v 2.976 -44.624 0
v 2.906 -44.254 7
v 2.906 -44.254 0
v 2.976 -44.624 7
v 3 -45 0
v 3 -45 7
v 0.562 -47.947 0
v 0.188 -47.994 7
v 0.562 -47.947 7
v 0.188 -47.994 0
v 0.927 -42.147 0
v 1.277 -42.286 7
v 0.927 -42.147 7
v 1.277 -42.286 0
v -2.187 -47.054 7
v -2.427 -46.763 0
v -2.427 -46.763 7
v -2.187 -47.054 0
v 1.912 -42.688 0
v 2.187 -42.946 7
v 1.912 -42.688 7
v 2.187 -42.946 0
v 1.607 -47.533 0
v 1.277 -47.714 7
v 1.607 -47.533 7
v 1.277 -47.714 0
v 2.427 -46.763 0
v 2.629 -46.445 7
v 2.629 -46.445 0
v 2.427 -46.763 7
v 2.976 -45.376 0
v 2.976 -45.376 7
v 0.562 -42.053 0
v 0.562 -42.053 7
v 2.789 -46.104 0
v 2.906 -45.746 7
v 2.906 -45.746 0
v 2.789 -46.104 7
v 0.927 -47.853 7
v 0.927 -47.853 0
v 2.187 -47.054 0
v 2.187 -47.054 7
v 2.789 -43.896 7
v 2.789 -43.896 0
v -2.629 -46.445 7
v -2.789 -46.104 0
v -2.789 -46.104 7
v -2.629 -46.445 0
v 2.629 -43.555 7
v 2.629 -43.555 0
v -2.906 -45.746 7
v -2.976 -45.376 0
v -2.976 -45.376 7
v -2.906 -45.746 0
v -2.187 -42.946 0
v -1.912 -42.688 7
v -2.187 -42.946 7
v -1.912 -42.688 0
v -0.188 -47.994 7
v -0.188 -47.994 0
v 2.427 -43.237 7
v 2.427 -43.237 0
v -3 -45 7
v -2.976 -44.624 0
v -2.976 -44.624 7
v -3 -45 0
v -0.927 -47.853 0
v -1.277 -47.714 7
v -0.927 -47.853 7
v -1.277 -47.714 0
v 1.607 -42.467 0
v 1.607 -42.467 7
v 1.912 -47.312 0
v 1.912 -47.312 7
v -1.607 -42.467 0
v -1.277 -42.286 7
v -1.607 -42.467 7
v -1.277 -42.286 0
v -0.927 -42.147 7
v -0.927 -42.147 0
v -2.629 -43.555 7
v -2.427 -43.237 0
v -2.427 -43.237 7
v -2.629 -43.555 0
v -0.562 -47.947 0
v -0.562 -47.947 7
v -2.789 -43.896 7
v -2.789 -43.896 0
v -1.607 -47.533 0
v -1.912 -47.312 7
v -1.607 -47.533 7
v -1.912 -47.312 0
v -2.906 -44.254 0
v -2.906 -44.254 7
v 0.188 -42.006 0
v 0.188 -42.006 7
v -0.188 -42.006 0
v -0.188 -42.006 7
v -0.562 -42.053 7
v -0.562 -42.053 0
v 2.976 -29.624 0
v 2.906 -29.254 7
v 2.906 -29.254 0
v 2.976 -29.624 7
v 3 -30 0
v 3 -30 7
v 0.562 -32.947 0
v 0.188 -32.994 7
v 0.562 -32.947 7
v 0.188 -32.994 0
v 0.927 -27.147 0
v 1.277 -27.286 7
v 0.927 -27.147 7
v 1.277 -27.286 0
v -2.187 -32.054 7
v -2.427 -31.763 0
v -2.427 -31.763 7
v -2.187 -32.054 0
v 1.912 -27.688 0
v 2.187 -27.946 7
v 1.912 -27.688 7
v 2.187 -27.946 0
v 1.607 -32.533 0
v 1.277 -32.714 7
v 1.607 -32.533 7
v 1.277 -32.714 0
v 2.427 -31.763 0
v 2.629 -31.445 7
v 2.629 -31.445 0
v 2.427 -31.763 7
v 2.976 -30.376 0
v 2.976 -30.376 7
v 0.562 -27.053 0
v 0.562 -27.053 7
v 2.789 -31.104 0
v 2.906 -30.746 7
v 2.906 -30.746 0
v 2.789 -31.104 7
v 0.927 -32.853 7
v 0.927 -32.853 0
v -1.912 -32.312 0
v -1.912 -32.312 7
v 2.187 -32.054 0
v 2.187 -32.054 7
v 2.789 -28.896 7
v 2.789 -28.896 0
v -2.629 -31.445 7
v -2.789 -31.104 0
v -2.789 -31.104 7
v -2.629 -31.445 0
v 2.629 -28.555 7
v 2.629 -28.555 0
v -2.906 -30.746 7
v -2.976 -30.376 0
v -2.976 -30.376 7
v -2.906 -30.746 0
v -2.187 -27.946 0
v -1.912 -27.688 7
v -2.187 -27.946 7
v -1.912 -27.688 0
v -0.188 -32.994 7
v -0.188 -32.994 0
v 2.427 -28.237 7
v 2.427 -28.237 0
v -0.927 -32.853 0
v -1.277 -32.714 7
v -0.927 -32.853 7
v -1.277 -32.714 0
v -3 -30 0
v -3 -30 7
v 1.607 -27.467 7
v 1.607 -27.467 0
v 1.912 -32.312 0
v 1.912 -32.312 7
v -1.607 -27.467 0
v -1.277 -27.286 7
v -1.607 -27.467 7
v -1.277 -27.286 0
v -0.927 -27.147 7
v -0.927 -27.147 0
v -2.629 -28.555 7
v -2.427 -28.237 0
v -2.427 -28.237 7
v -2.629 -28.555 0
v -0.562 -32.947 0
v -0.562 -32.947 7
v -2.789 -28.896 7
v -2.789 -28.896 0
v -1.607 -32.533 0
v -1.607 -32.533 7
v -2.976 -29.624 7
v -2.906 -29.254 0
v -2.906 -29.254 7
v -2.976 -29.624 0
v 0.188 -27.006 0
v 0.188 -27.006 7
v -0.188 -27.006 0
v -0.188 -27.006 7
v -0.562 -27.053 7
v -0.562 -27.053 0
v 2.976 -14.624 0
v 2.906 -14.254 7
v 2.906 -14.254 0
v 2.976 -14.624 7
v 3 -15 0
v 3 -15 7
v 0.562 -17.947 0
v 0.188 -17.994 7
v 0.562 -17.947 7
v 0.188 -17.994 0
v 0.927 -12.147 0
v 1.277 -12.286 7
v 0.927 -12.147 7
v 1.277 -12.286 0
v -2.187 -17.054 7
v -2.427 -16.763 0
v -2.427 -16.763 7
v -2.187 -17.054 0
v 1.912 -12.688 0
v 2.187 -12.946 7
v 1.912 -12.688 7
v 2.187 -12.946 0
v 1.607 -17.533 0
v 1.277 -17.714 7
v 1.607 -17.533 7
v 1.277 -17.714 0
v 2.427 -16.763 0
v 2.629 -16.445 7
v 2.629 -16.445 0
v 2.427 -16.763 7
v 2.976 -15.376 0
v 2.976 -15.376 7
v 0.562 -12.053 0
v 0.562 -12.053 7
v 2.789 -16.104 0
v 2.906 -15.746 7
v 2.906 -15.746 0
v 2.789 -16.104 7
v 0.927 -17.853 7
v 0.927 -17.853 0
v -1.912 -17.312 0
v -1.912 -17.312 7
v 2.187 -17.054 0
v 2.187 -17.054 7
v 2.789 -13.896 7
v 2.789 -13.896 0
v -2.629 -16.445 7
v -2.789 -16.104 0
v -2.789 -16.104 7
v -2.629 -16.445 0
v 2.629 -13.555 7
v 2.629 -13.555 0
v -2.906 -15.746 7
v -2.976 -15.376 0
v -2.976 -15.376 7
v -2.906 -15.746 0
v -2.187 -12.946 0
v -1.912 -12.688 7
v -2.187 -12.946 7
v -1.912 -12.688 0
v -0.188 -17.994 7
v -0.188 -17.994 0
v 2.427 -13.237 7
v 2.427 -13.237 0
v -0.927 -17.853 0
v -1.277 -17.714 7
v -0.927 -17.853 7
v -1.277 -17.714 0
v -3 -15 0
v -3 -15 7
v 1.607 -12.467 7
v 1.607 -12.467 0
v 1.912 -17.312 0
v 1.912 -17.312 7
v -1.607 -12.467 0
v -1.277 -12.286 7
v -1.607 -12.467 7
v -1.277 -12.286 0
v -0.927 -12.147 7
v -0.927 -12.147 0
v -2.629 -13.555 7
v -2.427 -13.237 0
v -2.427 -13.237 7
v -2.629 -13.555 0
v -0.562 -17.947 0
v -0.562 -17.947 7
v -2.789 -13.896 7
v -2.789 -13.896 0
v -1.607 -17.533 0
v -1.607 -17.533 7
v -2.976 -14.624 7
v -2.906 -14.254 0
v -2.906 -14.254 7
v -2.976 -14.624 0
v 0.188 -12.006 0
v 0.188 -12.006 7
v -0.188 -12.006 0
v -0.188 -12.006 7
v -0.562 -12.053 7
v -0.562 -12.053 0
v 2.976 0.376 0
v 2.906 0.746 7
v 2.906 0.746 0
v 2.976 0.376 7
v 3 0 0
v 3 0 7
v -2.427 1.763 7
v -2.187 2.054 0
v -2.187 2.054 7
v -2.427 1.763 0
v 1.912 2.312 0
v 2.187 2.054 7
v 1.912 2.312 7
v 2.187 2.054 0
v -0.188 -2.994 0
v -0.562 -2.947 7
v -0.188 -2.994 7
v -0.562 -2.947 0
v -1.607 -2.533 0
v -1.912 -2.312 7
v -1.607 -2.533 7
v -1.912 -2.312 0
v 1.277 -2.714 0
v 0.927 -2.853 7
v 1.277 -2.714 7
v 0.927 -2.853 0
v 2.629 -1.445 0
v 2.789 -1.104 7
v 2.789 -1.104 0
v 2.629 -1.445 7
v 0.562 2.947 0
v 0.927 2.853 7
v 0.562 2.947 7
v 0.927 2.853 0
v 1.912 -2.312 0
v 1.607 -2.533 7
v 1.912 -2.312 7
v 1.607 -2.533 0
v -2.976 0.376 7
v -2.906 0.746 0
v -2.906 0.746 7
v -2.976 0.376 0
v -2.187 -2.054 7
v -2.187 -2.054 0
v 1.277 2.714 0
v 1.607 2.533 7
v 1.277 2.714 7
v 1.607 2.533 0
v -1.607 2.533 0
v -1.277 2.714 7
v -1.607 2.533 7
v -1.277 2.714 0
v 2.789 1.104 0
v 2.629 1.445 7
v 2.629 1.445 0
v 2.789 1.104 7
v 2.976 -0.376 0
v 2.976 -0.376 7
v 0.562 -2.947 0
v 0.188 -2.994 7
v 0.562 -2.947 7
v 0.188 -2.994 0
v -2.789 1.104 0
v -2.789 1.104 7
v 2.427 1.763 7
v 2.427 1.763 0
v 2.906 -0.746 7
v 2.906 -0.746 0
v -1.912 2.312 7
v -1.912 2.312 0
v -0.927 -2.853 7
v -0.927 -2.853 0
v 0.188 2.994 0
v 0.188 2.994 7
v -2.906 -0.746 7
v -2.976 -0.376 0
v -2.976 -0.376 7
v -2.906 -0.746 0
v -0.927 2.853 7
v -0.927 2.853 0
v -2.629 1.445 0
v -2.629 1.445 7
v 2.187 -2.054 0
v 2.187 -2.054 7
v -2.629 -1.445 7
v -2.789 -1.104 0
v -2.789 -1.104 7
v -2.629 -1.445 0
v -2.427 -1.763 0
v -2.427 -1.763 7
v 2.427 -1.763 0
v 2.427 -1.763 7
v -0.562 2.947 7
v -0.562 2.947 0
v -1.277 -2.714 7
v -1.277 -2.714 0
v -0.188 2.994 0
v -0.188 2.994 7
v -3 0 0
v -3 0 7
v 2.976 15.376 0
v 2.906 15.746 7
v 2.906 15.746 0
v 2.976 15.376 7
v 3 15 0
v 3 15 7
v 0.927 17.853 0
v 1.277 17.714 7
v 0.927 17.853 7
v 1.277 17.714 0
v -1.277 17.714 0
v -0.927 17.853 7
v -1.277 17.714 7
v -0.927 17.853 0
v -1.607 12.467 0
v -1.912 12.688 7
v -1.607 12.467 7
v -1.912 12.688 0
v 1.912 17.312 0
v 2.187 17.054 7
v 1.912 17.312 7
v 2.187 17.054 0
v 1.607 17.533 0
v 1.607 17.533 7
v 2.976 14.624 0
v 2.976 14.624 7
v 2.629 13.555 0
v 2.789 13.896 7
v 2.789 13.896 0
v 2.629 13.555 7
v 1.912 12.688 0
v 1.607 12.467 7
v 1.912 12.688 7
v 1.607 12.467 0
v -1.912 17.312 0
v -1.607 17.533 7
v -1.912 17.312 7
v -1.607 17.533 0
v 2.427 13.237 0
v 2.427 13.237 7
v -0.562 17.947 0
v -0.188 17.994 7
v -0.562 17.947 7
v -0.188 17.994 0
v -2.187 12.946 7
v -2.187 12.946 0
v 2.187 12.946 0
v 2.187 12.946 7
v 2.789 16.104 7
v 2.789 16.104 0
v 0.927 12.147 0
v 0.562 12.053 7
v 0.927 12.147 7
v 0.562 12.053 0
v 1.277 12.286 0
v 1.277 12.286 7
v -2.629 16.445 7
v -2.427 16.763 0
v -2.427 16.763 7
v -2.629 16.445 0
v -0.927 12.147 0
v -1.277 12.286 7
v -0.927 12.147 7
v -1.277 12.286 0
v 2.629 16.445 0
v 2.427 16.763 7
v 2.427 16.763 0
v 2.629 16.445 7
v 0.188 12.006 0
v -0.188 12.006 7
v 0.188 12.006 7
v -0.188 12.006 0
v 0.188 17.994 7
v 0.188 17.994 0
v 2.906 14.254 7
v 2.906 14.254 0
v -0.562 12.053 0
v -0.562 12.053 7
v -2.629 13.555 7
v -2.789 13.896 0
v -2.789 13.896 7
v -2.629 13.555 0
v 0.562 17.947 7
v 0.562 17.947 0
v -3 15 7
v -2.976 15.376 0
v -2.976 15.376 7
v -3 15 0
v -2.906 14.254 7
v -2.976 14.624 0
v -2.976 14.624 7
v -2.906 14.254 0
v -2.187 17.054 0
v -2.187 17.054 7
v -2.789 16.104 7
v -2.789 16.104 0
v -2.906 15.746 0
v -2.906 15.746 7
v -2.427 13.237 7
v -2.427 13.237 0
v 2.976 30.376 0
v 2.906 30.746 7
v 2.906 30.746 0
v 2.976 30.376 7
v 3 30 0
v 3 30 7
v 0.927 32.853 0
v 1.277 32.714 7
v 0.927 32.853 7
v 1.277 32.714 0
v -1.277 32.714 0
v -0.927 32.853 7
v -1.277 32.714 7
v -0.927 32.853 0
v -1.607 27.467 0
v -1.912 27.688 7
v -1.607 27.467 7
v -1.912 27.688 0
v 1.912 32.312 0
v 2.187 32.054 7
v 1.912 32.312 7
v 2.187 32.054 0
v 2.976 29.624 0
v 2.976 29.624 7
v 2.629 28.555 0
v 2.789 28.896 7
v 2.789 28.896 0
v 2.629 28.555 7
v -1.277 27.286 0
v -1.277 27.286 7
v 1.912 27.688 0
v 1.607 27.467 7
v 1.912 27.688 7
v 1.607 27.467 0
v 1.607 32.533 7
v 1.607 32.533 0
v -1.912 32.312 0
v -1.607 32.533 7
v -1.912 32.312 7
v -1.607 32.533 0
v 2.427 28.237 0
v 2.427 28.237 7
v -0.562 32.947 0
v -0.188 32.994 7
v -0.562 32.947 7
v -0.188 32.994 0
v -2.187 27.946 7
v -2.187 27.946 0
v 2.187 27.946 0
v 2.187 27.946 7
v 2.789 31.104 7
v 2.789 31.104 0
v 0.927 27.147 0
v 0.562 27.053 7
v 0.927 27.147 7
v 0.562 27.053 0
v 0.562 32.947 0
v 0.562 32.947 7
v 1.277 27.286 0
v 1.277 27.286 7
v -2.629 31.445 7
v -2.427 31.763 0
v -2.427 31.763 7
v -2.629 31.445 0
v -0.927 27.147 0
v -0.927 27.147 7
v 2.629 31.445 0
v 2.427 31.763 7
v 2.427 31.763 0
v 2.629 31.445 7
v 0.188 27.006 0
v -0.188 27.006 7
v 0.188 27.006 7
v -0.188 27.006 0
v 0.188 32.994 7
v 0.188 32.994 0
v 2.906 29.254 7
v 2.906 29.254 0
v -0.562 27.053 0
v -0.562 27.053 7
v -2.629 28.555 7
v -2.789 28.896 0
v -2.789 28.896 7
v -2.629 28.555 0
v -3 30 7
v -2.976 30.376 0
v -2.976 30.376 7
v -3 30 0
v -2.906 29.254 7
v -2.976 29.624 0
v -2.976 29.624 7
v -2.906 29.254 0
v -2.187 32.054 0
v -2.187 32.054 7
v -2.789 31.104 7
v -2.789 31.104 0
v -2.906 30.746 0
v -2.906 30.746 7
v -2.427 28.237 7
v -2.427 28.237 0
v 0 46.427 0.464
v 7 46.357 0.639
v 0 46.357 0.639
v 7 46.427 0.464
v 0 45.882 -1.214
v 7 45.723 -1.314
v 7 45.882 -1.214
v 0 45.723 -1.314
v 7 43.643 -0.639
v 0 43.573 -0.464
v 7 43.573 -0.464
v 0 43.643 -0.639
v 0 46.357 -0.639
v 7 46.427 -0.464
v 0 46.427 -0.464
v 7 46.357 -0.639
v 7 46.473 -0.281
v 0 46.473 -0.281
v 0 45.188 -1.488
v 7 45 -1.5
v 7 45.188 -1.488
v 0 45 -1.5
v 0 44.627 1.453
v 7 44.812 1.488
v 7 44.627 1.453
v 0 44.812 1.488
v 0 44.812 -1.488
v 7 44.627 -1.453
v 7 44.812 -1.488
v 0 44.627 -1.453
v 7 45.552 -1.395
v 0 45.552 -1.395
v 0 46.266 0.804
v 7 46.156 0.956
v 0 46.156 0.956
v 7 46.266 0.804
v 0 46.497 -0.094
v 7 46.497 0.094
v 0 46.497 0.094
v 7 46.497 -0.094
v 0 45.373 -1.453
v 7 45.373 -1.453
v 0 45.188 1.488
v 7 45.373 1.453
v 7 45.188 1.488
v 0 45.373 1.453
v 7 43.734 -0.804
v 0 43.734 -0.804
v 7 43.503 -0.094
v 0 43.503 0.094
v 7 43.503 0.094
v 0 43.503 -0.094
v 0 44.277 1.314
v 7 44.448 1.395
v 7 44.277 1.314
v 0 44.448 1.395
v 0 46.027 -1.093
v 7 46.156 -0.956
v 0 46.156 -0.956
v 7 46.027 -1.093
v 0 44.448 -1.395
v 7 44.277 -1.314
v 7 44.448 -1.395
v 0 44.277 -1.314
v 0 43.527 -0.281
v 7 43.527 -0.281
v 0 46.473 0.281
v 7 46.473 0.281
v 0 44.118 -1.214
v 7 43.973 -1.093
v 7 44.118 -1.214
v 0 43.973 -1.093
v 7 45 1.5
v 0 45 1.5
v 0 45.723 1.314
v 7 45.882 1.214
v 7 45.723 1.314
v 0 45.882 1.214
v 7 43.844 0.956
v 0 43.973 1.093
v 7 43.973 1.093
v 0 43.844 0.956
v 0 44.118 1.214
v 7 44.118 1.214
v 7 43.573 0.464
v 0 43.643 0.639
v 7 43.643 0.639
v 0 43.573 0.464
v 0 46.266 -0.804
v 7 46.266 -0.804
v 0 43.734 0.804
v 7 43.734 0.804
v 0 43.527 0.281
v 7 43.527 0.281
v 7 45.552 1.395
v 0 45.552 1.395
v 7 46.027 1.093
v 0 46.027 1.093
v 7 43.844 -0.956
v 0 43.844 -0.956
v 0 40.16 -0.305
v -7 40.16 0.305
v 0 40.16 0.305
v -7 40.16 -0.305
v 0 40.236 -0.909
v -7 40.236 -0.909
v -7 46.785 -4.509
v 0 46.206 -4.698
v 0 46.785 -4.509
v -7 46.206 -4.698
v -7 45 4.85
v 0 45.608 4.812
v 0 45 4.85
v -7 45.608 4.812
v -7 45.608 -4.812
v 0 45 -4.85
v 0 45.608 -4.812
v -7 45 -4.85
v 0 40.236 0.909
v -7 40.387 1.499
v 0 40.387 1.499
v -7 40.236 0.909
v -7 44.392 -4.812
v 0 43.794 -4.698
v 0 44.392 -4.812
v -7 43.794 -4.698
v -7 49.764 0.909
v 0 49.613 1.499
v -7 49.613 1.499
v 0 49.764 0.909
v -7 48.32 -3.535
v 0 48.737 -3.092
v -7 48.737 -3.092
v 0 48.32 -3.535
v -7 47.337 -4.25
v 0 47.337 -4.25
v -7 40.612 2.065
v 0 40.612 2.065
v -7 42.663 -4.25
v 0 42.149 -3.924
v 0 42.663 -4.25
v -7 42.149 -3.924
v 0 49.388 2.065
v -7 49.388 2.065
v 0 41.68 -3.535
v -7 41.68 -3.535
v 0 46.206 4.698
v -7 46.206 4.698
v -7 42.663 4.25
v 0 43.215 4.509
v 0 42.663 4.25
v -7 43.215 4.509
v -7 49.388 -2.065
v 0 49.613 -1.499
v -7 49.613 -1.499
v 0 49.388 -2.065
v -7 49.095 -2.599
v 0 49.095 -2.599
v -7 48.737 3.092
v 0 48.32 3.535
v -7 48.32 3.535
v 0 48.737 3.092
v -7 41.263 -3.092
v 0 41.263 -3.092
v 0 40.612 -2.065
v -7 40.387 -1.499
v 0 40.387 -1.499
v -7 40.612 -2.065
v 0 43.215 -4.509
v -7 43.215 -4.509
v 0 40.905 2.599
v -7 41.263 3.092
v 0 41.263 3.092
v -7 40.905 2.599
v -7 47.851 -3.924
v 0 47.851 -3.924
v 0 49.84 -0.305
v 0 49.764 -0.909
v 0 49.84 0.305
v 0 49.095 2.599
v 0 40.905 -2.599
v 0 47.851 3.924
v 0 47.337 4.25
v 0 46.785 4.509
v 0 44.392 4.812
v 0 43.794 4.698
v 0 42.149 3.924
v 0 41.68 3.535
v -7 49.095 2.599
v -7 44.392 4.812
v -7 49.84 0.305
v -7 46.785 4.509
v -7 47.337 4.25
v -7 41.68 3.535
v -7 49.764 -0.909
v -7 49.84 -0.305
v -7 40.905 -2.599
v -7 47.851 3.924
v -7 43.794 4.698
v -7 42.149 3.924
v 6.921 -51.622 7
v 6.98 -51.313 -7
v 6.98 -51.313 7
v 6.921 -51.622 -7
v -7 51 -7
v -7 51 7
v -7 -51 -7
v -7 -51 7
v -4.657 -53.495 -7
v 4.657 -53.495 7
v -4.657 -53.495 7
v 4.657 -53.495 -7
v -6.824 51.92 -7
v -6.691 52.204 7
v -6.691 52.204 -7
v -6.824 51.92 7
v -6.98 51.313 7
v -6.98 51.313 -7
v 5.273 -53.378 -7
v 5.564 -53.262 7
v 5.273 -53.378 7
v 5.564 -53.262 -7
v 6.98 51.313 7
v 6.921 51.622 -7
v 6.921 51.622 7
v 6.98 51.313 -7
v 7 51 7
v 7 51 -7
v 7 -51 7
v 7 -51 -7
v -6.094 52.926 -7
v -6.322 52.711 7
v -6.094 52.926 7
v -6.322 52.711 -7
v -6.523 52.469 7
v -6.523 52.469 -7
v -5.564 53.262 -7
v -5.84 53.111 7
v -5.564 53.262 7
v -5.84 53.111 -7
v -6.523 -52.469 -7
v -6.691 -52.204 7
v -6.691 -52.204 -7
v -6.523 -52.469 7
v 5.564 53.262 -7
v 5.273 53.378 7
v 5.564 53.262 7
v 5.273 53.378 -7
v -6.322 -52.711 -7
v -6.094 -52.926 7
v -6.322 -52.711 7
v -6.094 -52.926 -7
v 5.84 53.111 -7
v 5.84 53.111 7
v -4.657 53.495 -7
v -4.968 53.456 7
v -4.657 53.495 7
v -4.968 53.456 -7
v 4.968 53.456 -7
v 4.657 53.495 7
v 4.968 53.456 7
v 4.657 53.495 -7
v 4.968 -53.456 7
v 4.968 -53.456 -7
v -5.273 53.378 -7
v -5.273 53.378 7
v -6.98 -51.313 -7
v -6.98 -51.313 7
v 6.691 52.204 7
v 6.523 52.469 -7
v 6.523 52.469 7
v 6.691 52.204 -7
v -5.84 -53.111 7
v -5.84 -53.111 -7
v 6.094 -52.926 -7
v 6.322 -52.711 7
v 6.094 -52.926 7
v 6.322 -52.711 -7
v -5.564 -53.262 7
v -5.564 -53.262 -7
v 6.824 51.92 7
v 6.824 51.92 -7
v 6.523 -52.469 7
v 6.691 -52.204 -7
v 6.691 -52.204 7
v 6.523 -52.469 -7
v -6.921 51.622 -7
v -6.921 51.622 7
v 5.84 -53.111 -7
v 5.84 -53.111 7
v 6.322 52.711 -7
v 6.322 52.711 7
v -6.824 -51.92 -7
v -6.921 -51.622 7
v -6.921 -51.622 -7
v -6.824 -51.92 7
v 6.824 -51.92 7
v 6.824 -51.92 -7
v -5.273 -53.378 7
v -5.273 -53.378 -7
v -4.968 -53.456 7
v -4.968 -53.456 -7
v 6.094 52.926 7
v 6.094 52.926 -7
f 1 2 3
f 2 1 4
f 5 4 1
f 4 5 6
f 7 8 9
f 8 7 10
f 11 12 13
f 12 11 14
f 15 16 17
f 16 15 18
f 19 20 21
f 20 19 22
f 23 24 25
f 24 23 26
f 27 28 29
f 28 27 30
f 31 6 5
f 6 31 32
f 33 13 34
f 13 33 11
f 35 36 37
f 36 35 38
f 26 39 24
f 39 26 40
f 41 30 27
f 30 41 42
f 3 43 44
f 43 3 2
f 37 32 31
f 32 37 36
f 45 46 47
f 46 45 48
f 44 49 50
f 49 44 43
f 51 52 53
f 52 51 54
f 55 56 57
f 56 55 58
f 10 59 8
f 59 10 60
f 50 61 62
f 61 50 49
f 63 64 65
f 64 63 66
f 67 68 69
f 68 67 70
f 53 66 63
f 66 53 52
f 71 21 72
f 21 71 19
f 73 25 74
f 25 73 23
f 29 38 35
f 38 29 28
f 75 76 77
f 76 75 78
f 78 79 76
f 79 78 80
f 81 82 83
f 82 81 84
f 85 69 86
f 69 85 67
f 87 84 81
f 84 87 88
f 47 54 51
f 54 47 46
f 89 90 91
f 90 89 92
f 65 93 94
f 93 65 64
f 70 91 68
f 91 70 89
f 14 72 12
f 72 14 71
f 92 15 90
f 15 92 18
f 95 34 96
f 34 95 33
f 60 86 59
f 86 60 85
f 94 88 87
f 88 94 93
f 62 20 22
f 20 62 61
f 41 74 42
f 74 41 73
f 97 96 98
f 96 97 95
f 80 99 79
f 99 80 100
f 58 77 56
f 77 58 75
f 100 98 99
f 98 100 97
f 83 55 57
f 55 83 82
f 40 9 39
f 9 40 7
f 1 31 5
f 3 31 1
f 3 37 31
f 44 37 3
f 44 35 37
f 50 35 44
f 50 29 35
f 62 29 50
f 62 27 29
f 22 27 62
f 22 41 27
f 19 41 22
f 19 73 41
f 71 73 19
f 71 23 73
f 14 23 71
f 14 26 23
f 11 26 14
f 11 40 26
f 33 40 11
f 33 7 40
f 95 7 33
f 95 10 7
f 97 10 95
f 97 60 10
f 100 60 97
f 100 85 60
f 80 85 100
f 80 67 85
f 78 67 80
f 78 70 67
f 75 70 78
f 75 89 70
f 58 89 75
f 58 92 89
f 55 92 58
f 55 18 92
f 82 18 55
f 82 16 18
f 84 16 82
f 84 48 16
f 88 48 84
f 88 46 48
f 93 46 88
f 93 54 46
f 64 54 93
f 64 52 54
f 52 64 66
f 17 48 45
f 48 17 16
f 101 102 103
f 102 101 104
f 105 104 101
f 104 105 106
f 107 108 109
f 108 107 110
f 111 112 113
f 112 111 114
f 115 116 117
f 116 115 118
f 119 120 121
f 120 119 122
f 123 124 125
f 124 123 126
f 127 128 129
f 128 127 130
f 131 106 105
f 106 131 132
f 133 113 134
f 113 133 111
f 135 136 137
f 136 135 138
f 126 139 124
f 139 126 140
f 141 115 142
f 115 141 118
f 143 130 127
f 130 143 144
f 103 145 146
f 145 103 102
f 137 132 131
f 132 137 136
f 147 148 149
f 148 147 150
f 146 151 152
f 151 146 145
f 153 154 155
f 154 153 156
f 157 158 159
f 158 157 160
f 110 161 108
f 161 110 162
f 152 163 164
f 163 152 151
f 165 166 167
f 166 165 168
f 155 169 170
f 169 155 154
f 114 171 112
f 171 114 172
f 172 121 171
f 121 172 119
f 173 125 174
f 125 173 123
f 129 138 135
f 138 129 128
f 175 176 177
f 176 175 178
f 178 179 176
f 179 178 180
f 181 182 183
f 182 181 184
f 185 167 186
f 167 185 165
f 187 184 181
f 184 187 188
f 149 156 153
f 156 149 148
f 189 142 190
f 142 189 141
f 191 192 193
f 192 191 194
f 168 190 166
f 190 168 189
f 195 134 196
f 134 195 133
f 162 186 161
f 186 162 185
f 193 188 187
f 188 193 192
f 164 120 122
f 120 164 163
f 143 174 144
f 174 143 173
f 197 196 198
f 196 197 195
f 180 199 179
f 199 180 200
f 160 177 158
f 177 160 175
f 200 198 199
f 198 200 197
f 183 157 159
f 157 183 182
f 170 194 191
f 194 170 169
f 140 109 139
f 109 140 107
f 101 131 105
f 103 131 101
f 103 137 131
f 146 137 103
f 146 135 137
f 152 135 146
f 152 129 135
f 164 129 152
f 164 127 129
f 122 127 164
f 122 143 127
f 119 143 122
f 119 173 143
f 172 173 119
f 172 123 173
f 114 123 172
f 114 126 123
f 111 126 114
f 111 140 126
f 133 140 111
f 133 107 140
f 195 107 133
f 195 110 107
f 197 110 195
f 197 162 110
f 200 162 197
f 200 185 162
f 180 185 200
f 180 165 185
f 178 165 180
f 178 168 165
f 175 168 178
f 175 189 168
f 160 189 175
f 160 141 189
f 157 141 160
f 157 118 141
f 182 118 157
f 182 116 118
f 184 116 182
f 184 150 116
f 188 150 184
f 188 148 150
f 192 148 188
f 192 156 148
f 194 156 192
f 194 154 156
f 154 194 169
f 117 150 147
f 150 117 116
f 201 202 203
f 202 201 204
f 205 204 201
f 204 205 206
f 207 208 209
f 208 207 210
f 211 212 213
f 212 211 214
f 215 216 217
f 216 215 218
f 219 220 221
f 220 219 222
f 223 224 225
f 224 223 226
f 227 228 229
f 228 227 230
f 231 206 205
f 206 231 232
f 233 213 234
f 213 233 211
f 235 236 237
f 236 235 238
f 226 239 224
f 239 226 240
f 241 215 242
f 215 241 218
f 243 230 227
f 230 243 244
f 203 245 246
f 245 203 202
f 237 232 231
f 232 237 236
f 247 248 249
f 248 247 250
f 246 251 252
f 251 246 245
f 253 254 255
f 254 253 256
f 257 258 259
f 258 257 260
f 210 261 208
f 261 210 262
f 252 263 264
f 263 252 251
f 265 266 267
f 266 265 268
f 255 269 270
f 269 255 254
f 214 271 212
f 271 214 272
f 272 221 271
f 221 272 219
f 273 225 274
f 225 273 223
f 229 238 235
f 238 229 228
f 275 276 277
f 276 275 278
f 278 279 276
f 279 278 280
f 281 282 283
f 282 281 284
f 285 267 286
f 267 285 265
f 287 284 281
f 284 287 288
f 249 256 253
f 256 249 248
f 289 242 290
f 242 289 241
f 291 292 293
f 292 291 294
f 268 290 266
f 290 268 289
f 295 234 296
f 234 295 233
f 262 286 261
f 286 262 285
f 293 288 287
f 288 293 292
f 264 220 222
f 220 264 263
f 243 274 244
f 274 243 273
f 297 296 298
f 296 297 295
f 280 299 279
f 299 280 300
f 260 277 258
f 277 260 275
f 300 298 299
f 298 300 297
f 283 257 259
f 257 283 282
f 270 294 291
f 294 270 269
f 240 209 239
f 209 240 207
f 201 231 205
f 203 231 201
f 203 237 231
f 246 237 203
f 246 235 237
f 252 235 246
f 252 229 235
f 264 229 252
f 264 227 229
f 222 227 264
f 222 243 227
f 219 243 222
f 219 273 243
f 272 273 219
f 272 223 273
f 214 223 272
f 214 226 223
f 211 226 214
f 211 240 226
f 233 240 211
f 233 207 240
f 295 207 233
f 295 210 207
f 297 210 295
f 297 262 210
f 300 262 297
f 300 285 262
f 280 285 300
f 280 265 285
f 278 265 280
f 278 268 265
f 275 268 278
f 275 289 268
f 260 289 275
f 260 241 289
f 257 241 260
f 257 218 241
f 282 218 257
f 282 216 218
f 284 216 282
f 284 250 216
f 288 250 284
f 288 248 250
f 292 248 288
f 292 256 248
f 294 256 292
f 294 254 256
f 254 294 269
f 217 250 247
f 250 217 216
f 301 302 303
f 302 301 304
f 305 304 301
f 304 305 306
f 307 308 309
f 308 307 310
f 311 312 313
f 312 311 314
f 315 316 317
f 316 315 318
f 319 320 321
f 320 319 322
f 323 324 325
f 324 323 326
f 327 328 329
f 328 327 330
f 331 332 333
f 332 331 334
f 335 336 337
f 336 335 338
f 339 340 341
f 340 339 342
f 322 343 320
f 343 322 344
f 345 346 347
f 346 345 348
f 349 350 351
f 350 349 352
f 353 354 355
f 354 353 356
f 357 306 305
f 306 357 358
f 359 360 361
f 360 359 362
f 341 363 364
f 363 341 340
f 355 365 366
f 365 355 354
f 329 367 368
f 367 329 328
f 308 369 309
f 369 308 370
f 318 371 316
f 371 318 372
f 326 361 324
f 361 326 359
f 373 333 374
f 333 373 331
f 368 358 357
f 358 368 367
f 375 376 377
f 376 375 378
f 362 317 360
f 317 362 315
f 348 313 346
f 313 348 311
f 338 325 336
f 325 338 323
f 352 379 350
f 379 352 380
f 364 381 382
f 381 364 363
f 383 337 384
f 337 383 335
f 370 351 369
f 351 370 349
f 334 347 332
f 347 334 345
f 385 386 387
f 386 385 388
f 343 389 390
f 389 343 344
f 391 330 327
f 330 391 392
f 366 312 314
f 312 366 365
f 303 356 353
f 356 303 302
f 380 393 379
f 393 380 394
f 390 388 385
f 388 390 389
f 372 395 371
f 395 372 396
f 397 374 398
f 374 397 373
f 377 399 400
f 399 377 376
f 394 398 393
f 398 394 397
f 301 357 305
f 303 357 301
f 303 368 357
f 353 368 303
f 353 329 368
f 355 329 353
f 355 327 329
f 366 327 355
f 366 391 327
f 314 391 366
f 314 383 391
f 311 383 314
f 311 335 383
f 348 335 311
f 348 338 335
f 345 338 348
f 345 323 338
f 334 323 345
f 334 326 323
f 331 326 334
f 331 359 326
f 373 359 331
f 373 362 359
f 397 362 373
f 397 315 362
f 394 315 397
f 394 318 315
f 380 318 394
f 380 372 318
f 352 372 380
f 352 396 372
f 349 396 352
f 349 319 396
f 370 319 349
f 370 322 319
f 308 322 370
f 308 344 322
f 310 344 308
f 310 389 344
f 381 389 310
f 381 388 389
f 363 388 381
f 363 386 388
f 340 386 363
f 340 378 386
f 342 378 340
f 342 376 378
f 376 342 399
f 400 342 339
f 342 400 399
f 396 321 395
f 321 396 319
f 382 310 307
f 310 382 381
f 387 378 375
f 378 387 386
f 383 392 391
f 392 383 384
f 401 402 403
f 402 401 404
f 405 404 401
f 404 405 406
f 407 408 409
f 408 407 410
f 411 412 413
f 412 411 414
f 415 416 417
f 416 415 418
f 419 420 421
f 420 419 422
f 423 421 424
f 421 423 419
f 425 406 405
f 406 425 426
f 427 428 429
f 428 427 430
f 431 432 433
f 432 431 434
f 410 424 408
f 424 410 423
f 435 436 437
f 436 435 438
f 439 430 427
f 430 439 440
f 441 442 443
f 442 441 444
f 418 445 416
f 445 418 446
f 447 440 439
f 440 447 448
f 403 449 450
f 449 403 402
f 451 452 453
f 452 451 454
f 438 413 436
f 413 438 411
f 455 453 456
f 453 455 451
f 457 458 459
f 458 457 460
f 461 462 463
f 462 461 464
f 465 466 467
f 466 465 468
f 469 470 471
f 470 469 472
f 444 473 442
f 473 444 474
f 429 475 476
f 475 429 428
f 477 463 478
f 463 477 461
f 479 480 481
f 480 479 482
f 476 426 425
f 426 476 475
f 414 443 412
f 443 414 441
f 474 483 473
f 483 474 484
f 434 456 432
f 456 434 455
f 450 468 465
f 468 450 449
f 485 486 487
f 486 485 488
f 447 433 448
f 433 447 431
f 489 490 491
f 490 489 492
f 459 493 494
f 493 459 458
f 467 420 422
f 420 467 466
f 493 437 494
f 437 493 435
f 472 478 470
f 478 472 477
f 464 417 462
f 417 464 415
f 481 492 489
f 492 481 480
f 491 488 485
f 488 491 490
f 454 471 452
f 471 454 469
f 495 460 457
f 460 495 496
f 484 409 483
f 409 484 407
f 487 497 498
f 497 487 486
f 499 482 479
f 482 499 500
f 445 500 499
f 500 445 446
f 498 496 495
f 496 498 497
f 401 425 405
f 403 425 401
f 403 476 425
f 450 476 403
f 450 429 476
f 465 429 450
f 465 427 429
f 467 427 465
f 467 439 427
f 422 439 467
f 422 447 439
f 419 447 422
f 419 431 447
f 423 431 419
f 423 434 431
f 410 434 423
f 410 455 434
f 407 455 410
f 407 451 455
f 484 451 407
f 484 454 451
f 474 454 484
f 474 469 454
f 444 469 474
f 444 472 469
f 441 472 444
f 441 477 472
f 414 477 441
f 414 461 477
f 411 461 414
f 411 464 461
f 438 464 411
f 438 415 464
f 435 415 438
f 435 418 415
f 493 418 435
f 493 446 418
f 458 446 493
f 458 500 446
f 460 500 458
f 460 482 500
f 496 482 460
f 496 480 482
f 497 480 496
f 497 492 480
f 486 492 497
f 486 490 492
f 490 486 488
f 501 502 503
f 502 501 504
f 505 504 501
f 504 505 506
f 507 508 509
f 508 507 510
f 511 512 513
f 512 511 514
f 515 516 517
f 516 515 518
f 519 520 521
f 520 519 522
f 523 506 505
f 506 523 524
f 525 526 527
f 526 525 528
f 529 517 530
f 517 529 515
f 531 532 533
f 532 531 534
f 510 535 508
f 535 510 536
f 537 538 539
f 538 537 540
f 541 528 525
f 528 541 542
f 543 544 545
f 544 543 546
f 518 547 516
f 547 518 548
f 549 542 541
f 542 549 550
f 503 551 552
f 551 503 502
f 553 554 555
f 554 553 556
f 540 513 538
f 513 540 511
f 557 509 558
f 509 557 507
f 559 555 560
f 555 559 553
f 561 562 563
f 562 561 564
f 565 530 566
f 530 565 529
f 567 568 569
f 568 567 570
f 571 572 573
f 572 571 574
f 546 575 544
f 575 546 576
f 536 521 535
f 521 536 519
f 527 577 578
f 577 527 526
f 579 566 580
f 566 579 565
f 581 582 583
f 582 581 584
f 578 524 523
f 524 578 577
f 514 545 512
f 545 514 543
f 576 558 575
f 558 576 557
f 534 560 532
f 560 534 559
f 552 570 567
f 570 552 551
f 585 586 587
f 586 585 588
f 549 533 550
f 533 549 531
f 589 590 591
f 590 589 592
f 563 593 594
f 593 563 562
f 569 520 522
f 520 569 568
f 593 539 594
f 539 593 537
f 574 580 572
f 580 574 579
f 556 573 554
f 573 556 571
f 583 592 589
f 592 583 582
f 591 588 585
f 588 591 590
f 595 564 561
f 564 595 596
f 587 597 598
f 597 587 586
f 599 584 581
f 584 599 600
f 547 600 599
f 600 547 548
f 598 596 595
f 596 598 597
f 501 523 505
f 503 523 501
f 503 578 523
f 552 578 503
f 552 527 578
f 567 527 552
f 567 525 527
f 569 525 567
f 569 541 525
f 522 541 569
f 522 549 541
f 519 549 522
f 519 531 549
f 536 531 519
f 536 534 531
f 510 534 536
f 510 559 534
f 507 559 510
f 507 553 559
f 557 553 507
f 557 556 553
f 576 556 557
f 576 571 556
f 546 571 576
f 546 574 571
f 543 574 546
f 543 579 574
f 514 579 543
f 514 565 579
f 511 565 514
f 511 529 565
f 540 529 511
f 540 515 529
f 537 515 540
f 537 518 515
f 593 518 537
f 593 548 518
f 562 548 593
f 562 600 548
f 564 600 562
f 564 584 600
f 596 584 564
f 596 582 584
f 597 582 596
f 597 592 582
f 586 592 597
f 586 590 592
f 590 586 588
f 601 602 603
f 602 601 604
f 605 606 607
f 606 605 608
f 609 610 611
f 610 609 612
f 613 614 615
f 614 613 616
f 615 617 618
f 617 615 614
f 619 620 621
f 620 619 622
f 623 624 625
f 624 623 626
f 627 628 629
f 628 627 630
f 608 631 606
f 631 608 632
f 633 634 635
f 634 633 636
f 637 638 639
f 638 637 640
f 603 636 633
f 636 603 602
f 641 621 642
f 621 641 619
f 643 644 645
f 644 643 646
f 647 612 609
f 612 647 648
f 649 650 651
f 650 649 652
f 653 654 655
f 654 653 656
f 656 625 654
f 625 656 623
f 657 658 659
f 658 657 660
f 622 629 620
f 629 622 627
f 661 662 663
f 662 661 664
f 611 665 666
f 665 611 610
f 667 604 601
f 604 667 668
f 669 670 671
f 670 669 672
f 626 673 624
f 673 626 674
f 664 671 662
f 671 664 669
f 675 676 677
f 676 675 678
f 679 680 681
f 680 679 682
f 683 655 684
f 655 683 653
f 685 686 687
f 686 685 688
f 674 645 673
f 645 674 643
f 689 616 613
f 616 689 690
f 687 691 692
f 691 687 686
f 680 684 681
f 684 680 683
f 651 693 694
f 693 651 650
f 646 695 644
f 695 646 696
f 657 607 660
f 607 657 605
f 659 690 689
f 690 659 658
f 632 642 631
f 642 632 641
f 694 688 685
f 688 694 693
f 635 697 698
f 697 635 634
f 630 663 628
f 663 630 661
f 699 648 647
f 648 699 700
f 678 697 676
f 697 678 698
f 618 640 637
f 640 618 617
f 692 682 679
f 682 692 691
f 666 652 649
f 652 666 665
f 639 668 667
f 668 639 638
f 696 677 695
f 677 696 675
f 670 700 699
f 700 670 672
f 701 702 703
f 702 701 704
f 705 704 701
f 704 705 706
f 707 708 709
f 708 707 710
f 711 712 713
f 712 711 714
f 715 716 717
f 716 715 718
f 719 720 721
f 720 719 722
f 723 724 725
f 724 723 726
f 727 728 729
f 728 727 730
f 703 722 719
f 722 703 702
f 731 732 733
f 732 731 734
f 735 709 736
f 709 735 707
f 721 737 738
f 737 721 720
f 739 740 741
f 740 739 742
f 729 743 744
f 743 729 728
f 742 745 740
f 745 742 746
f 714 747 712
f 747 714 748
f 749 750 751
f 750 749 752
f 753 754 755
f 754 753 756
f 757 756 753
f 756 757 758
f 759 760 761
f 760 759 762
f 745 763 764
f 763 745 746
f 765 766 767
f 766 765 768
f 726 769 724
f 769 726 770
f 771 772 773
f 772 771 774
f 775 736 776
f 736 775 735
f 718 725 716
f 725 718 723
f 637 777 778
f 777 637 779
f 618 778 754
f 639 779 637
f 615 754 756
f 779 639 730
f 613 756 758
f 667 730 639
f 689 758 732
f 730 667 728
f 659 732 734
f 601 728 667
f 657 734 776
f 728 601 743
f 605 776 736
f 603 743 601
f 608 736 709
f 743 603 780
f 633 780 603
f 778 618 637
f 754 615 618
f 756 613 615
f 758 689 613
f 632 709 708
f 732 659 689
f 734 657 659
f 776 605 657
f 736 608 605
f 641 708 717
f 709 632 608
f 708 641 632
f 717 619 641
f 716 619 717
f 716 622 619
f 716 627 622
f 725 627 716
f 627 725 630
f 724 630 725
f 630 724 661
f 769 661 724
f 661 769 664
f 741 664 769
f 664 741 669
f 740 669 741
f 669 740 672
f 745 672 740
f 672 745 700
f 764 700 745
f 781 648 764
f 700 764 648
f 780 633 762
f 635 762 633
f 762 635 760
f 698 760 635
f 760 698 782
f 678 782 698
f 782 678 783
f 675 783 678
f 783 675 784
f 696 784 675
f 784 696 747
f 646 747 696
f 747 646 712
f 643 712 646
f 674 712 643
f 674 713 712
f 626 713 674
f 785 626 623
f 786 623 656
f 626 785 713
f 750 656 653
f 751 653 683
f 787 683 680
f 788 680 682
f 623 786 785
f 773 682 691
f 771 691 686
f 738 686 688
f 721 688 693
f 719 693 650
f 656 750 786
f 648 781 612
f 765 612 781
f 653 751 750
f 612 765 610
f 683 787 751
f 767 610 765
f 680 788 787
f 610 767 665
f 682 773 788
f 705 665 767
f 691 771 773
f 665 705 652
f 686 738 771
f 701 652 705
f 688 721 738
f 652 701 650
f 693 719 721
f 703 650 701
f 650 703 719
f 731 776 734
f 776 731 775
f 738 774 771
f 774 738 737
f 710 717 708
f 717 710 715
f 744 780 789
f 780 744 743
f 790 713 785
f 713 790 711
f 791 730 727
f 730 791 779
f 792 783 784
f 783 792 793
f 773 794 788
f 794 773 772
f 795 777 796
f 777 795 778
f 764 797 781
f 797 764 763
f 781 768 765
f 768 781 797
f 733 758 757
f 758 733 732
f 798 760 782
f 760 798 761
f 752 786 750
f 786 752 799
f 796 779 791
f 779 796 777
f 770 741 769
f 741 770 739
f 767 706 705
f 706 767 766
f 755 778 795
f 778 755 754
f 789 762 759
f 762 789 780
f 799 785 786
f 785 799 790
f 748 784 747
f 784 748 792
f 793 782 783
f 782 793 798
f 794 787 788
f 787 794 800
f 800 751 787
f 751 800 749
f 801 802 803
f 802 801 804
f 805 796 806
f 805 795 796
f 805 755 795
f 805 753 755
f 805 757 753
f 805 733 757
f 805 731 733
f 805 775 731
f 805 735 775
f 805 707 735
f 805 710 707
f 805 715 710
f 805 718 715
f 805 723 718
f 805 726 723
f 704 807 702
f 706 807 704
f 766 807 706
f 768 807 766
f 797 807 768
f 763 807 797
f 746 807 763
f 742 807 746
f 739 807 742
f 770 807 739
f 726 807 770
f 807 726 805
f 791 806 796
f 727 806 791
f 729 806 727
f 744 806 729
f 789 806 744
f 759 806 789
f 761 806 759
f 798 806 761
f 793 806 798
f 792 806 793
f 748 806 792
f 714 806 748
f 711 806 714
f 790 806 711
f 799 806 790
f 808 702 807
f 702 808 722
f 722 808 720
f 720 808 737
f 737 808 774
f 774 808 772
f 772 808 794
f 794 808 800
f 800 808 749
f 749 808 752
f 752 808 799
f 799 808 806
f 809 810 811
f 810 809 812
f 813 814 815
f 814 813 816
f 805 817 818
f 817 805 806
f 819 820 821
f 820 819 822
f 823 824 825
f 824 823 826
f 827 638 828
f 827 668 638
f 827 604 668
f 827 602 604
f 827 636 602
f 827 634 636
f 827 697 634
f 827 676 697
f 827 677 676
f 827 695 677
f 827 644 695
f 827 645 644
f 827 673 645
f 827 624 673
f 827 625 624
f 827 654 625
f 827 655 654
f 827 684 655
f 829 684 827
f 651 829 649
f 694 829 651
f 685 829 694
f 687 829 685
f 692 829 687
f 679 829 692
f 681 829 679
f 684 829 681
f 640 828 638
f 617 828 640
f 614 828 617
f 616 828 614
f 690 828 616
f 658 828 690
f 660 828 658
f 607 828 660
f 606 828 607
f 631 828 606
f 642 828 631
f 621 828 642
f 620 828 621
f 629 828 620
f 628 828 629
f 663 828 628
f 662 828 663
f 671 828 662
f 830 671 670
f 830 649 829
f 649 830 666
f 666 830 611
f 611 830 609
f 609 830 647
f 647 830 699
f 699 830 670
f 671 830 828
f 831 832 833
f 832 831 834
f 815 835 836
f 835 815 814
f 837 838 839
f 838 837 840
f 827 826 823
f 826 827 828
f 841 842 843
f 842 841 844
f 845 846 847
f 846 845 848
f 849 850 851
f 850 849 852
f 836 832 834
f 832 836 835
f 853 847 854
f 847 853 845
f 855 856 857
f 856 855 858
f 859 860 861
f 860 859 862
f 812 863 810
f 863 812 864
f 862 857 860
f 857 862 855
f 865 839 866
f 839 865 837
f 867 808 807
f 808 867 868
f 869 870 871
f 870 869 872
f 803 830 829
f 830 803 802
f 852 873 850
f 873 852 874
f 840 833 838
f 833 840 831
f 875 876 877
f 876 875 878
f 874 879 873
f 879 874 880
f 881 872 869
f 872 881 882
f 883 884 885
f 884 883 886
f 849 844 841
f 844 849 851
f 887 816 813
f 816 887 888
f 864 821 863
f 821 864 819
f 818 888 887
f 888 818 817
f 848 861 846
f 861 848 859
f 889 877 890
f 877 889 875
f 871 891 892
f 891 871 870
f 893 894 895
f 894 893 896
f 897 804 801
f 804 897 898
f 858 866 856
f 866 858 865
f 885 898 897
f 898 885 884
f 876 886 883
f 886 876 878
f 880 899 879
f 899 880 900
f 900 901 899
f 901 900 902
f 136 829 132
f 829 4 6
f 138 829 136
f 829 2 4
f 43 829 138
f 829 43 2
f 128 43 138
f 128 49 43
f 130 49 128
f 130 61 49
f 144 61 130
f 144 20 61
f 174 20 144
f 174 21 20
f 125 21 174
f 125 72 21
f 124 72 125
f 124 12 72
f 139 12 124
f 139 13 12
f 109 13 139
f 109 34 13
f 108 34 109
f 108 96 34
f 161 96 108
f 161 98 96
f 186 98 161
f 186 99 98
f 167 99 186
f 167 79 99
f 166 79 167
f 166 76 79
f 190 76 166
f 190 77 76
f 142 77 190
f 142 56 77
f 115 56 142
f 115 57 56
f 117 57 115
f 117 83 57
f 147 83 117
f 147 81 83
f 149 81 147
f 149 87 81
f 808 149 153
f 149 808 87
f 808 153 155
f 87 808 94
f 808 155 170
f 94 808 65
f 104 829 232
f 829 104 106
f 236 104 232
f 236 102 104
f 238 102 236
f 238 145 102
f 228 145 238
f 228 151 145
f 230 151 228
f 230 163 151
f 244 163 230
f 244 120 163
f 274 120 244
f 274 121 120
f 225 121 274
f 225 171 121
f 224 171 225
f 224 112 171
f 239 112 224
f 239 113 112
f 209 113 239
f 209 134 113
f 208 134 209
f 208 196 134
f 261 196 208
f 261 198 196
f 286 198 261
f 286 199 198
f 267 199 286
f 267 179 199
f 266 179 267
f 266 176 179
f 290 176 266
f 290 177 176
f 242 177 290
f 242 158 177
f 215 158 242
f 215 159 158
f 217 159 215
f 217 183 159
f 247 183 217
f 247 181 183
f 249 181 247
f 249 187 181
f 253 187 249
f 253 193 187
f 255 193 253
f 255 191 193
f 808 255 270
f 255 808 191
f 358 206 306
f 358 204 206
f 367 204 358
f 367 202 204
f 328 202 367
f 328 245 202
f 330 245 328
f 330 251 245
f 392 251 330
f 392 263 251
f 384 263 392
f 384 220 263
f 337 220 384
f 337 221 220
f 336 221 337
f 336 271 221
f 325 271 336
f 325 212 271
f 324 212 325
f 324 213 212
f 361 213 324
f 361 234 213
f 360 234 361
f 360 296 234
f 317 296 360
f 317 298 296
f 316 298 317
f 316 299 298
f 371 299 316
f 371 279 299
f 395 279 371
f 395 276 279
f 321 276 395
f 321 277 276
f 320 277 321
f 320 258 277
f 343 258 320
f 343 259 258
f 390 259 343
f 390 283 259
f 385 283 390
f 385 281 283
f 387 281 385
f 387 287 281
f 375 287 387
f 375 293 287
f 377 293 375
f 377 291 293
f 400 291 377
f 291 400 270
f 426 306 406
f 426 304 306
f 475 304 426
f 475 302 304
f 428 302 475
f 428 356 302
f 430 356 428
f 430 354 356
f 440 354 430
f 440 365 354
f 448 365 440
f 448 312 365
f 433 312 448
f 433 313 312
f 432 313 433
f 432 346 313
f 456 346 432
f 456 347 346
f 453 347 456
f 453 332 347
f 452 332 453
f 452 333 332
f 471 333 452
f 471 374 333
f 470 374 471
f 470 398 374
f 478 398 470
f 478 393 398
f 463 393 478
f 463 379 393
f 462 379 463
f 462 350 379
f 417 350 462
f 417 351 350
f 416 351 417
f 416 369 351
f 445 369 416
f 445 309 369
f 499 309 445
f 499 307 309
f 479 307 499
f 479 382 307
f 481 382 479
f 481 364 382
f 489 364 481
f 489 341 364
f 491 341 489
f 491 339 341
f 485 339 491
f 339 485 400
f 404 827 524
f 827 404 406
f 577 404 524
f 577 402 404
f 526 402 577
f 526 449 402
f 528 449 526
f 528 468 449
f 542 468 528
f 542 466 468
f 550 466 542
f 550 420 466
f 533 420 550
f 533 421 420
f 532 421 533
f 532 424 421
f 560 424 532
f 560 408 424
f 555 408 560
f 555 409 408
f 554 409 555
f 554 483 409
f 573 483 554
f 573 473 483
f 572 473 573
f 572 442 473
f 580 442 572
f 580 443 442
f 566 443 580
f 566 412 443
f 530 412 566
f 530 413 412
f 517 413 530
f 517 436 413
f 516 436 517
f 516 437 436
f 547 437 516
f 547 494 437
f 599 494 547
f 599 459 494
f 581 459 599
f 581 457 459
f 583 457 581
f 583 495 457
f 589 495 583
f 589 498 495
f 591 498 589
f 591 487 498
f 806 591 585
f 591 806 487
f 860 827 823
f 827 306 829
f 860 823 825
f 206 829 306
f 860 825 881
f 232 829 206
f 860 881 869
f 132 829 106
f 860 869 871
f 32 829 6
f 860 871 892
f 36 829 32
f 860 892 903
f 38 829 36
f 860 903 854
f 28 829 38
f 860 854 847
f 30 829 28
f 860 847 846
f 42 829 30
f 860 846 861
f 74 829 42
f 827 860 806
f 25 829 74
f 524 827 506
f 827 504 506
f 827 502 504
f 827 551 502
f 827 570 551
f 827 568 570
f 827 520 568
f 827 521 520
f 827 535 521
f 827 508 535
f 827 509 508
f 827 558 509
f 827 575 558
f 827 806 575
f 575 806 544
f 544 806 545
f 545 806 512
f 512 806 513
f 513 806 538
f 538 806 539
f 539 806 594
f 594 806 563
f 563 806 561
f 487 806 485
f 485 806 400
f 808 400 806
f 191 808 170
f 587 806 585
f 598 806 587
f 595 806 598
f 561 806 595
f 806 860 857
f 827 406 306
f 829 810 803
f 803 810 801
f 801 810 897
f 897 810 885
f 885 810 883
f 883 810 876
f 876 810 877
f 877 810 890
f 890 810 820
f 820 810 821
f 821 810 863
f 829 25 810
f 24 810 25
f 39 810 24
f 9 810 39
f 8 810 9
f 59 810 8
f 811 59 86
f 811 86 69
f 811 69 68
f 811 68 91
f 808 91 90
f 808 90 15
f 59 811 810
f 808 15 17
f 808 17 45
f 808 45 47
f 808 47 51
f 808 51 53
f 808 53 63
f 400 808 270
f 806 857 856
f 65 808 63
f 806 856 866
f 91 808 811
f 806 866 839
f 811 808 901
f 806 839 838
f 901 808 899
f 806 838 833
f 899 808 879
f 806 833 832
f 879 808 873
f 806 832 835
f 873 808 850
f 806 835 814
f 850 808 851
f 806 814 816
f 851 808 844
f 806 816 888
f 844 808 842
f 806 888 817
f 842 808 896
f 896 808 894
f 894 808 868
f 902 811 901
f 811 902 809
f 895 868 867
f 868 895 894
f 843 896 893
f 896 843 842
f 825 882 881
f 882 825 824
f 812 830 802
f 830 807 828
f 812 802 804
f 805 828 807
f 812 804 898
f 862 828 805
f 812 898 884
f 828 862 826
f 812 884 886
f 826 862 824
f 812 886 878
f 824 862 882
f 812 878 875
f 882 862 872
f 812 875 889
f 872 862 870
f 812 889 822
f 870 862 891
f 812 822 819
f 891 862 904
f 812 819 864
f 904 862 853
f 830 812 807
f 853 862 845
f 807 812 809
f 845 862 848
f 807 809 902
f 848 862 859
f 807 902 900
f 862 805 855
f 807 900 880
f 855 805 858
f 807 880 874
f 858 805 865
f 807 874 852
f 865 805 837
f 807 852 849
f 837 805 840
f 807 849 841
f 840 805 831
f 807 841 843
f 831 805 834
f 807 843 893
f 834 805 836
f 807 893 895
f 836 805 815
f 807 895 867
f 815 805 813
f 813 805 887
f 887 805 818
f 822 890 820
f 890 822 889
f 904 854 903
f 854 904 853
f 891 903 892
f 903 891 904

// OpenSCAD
$fn = 50;


difference() {
	union() {
		translate(v = [0, 0, -7.0000000000]) {
			hull() {
				translate(v = [-4.5000000000, 51.0000000000, 0]) {
					cylinder(h = 14, r = 2.5000000000);
				}
				translate(v = [4.5000000000, 51.0000000000, 0]) {
					cylinder(h = 14, r = 2.5000000000);
				}
				translate(v = [-4.5000000000, -51.0000000000, 0]) {
					cylinder(h = 14, r = 2.5000000000);
				}
				translate(v = [4.5000000000, -51.0000000000, 0]) {
					cylinder(h = 14, r = 2.5000000000);
				}
			}
		}
	}
	union() {
		translate(v = [0.0000000000, -45.0000000000, 0]) {
			cylinder(h = 100, r = 3.0000000000);
		}
		translate(v = [0.0000000000, -30.0000000000, 0]) {
			cylinder(h = 100, r = 3.0000000000);
		}
		translate(v = [0.0000000000, -15.0000000000, 0]) {
			cylinder(h = 100, r = 3.0000000000);
		}
		cylinder(h = 100, r = 3.0000000000);
		translate(v = [0.0000000000, 15.0000000000, 0]) {
			cylinder(h = 100, r = 3.0000000000);
		}
		translate(v = [0.0000000000, 30.0000000000, 0]) {
			cylinder(h = 100, r = 3.0000000000);
		}
		translate(v = [-50, 45, 0]) {
			rotate(a = [0, 90, 0]) {
				cylinder(h = 100, r = 1.5000000000);
			}
		}
		translate(v = [-100, 45, 0]) {
			rotate(a = [0, 90, 0]) {
				cylinder(h = 100, r = 4.8500000000);
			}
		}
	}
}
